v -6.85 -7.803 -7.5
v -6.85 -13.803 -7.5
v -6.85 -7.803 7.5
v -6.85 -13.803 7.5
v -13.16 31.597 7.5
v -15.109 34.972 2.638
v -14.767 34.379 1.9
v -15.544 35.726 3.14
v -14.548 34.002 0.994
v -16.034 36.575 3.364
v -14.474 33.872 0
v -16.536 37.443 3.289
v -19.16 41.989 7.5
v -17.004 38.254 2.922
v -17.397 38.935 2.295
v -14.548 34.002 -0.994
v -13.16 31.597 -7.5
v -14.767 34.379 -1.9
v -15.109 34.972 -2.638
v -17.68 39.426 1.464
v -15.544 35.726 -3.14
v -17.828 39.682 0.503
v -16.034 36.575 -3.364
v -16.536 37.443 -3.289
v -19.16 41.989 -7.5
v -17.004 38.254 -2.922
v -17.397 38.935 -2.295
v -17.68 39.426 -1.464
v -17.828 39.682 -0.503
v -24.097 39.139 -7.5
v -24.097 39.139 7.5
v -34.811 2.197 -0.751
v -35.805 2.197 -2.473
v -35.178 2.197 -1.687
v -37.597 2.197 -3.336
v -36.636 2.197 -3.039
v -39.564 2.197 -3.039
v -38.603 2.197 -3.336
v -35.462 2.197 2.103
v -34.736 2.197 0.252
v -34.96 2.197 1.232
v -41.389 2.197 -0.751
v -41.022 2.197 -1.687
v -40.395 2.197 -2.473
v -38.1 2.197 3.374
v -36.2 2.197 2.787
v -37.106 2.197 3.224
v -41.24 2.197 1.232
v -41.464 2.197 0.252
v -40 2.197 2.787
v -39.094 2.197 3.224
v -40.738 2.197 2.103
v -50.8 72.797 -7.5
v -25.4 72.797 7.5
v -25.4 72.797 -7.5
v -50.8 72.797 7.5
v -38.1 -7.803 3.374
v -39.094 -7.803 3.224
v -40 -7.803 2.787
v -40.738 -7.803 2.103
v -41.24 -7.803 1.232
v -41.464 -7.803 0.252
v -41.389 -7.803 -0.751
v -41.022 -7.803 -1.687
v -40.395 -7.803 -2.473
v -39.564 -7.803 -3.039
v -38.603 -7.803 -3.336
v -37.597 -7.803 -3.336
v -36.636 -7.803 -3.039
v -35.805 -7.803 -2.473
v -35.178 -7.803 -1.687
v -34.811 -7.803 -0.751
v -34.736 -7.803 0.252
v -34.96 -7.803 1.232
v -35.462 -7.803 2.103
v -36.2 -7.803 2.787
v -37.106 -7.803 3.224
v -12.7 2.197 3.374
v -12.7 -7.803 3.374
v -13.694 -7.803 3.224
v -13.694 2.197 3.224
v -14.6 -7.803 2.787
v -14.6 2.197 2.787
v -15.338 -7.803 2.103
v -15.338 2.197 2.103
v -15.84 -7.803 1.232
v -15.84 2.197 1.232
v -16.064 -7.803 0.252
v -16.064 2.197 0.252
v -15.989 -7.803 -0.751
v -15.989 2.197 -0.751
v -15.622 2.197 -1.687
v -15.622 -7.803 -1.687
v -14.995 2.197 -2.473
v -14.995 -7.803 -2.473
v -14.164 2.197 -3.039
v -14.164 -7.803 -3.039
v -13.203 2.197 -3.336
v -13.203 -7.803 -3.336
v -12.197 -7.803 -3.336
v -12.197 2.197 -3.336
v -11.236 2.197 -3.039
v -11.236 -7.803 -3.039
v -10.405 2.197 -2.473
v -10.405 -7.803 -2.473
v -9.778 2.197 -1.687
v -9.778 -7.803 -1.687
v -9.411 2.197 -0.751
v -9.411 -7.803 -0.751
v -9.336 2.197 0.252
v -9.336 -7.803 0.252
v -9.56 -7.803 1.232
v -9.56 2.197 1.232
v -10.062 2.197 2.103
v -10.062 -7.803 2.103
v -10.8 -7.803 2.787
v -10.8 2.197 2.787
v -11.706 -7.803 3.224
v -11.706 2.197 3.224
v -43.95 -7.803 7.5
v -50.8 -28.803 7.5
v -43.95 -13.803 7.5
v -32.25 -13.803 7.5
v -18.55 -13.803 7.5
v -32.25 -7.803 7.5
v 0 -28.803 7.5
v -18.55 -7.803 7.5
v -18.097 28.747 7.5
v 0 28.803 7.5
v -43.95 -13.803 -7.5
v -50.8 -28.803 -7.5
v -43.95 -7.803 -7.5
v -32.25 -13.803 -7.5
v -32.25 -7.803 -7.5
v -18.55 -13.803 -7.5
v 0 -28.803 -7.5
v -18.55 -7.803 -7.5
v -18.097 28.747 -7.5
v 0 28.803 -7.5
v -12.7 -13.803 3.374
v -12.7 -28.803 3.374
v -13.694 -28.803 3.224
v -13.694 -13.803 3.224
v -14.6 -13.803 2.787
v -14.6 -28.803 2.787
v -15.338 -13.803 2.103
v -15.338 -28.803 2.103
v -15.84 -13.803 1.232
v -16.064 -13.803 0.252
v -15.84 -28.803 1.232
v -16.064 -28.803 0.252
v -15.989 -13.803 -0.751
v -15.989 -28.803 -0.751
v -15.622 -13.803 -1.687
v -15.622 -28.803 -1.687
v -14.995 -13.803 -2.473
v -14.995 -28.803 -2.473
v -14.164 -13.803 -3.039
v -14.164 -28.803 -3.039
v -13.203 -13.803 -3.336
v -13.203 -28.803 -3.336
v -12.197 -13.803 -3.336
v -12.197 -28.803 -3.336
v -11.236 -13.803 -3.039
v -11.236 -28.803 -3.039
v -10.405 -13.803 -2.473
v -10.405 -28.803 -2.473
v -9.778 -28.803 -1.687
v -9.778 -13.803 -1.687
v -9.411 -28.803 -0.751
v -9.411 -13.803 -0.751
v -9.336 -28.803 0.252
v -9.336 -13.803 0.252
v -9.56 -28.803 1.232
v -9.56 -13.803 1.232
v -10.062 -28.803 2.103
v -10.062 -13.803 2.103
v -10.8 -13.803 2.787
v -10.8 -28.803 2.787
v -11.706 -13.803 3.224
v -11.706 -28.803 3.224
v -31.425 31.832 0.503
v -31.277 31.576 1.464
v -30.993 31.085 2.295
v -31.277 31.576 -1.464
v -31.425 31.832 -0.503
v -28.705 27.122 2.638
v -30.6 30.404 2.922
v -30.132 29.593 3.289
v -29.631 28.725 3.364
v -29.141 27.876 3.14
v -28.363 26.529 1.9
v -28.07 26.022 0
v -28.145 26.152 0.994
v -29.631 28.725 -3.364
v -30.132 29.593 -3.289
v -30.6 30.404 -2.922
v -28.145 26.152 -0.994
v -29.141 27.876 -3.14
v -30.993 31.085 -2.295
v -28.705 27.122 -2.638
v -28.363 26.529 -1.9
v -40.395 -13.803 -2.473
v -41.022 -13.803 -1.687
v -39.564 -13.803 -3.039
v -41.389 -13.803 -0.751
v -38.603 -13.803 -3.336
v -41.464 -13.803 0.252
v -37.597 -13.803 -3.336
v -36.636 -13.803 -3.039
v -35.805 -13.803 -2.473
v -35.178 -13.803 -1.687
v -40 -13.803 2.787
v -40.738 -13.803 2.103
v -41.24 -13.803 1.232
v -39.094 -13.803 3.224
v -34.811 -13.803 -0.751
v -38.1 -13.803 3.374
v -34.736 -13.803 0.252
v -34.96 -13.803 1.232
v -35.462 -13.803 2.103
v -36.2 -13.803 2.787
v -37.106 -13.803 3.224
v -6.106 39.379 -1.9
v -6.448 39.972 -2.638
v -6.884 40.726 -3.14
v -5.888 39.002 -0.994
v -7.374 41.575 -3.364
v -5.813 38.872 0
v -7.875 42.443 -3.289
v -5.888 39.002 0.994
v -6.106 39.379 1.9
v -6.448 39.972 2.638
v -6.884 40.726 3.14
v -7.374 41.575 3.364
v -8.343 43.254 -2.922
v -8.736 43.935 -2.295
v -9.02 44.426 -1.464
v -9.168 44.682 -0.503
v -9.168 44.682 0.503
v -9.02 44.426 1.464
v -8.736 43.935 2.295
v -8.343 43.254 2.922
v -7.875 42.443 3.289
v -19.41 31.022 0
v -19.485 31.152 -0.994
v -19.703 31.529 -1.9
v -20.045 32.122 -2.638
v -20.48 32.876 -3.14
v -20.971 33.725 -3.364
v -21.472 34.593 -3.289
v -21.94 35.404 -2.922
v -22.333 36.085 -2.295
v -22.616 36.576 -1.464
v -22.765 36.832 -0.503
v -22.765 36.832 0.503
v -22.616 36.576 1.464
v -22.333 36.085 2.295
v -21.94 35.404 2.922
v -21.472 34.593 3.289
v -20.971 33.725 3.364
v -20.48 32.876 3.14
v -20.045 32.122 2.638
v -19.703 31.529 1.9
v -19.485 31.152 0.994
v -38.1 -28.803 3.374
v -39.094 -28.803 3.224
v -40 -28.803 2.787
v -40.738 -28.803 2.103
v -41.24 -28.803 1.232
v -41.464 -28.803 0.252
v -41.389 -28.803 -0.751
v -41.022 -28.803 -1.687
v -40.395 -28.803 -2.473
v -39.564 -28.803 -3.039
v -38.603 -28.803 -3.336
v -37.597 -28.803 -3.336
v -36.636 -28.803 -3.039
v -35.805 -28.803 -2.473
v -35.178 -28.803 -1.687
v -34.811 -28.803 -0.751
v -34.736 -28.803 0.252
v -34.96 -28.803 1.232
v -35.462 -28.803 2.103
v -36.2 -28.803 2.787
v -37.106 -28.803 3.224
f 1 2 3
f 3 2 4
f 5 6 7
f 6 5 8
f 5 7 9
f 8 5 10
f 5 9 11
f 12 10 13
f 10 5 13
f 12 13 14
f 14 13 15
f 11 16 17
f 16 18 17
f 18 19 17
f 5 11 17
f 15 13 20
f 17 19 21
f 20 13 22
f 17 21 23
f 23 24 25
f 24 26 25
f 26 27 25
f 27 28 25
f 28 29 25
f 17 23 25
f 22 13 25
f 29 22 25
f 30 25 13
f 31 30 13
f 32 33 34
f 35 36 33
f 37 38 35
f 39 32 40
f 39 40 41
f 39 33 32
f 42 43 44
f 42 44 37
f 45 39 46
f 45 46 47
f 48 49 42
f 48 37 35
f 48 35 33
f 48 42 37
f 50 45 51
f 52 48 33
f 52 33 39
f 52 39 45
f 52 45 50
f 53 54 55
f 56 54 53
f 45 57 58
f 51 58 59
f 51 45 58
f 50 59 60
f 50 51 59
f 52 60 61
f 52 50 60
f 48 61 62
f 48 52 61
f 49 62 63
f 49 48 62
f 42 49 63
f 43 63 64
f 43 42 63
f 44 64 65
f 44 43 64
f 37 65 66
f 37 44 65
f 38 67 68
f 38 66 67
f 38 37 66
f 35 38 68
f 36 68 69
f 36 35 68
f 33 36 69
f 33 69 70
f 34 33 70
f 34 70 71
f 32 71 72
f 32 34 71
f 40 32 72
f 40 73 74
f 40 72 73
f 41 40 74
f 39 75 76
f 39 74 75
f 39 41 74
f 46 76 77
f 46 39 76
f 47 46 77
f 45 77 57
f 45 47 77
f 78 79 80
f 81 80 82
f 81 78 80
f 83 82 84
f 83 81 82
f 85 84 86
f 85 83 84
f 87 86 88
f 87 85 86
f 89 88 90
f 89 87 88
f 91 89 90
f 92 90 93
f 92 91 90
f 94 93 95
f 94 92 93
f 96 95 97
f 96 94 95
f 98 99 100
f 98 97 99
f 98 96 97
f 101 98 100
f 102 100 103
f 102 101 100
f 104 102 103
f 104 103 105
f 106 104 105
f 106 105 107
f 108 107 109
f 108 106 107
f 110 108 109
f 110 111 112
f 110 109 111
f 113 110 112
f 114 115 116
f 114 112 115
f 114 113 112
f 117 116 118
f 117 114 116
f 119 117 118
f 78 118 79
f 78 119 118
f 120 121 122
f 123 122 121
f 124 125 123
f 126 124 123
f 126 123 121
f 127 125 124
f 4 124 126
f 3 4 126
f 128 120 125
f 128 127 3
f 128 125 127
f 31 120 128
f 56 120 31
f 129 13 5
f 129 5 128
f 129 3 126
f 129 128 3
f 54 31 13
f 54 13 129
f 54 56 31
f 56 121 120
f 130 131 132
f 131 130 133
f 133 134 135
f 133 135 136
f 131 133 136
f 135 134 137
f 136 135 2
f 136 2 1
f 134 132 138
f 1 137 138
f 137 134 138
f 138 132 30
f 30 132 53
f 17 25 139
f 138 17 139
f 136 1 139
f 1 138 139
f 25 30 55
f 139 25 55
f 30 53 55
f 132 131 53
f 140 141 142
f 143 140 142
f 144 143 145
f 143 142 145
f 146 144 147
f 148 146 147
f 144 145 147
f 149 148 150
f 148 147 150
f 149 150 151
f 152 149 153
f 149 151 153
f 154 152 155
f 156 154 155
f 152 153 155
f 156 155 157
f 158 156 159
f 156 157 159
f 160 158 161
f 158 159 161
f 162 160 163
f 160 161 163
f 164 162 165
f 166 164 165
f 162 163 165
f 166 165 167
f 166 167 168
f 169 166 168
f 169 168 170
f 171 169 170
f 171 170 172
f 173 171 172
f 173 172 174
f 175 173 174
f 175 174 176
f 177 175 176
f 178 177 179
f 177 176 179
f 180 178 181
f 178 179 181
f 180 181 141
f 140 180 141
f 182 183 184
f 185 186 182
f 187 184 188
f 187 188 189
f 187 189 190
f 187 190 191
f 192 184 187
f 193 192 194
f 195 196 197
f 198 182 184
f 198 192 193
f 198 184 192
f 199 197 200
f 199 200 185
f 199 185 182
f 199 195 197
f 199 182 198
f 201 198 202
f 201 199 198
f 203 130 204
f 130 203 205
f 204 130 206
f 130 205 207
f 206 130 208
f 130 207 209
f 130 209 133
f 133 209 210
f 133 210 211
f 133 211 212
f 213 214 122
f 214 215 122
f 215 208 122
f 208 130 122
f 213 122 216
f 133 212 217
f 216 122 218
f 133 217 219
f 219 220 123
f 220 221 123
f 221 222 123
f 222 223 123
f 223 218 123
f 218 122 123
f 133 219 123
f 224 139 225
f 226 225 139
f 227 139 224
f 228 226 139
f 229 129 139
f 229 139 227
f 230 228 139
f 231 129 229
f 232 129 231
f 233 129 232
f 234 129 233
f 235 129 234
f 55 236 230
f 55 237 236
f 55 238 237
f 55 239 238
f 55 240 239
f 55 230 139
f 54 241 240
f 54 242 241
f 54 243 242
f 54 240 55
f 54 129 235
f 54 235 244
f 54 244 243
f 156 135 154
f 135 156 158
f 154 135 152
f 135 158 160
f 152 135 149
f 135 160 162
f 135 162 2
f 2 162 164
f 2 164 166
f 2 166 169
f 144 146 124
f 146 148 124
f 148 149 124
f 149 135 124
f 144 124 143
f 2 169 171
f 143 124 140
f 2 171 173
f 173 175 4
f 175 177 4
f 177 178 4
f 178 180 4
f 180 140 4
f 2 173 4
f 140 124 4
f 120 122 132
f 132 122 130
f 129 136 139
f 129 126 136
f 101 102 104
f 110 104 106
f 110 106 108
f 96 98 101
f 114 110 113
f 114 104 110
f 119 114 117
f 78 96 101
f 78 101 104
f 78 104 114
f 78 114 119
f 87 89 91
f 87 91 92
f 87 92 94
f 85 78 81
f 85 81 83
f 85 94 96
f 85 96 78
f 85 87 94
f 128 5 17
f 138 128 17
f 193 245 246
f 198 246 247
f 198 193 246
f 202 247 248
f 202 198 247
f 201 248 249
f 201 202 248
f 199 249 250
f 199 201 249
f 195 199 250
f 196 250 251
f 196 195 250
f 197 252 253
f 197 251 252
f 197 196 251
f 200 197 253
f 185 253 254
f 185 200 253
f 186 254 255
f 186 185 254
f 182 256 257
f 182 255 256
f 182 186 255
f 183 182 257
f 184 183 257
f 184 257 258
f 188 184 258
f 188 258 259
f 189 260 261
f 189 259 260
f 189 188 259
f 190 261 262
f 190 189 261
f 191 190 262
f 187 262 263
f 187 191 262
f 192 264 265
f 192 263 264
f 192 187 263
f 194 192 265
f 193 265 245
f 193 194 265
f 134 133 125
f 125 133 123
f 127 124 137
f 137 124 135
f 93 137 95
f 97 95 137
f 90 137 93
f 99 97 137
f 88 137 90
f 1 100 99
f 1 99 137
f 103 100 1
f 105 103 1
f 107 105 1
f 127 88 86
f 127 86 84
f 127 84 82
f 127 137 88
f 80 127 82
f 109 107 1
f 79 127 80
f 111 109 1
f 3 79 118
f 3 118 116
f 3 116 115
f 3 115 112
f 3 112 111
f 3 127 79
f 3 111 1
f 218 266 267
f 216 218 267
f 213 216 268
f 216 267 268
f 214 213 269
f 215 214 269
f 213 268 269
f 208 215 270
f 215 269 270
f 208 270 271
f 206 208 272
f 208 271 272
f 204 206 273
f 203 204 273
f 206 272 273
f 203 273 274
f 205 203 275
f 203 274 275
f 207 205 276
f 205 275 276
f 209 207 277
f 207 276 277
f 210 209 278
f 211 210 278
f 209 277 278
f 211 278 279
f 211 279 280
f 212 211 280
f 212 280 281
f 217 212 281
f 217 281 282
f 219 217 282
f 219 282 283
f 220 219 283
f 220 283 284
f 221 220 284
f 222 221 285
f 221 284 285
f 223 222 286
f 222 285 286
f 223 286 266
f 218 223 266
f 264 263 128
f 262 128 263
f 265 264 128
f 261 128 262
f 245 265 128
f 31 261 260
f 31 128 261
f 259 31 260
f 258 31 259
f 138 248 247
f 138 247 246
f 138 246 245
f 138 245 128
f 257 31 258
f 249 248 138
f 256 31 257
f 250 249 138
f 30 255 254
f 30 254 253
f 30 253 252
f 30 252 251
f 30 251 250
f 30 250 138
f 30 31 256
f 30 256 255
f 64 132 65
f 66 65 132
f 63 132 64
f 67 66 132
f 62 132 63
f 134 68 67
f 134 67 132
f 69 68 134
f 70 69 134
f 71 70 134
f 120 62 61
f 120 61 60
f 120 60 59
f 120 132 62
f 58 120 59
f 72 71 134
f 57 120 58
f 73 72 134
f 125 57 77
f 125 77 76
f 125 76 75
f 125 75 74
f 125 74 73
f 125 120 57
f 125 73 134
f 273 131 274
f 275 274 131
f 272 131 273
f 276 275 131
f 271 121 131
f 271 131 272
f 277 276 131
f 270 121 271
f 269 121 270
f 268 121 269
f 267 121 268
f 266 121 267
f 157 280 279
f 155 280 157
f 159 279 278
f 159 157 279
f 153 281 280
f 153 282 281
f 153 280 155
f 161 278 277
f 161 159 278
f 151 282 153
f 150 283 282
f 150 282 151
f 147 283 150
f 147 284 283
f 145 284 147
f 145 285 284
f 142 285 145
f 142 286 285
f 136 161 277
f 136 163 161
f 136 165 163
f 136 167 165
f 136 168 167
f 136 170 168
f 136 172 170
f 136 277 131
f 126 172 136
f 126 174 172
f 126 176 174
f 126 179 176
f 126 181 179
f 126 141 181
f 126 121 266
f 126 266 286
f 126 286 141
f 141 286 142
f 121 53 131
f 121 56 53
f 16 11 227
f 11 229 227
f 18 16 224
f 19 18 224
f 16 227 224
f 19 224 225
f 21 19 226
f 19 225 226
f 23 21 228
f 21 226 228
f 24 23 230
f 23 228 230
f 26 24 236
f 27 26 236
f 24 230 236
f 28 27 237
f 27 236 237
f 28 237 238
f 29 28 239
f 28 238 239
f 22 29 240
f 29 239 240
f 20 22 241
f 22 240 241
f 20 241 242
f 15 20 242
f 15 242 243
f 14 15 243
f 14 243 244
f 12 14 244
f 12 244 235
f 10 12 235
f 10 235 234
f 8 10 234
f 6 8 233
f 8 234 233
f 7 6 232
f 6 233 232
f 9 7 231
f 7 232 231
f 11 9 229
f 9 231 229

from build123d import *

# Parameters (mm, degrees)
BOSS_EXTRUDE1_DEPTH                       = 7.5
CUT_EXTRUDE1_START                        = -10
CUT_EXTRUDE1_DEPTH                        = 5.7
SKETCH5_W                                 = 3.373501
SKETCH5_H                                 = 31.997045256
CUT_EXTRUDE2_START                        = -15
CUT_EXTRUDE2_DEPTH                        = 6
SKETCH8_W                                 = 3.373501
SKETCH8_H                                 = 15
F_17_64_0_26563_DIAMETER_HOLE2_AT_2_COUNT = 2
F_17_64_0_26563_DIAMETER_HOLE2_AT_2_PITCH = 25.4
CUT_EXTRUDE4_START                        = -31
SKETCH10_R                                = 3.373501
CUT_EXTRUDE4_DEPTH                        = 31
CUT_EXTRUDE5_START                        = -25.7
SKETCH11_R                                = 3.373501
CUT_EXTRUDE5_DEPTH                        = 25.7


with BuildPart() as part:
    # Sketch1 → Boss-Extrude1 (new, symmetric)
    with BuildSketch(Plane.XY):
        Polygon((0, -28.802954744), (0, 28.802954744), (-25.4, 72.797045256), (-50.8, 72.797045256), (-50.8, -28.802954744), (-25.4, -28.802954744), align=None)
    extrude(amount=BOSS_EXTRUDE1_DEPTH, both=True)

    # Sketch2 → Cut-Extrude1 (cut)
    with BuildSketch(Plane(origin=(12.472045256, 7.200738686, 0), x_dir=(0, 0, -1), z_dir=(0.8660254037844379, 0.5000000000000013, 0)).offset(CUT_EXTRUDE1_START)):
        Polygon((3.464101615, 33.944090512), (7.5, 33.944090512), (7.5, 45.944090512), (3.464101615, 45.944090512), (-3.464101615, 45.944090512), (-7.5, 45.944090512), (-7.5, 33.944090512), (-3.464101615, 33.944090512), align=None)
    extrude(amount=-CUT_EXTRUDE1_DEPTH, mode=Mode.SUBTRACT)

    # Sketch5 → 17/64 (0.26563) Diameter Hole1 (revolve, cut)
    with BuildSketch(Plane(origin=(-16.160254038, 36.793335801, 0), x_dir=(0.500000000000001, -0.866025403784438, 0), z_dir=(0, 0, 1))):
        with Locations((1.6867505, 15.998522628)):
            Rectangle(SKETCH5_W, SKETCH5_H)
    revolve(axis=Axis((-21.659515352, 33.618335801, 0), (0.866025403784438, 0.500000000000001, 0)), mode=Mode.SUBTRACT)

    # Sketch6 → Cut-Extrude2 (cut)
    with BuildSketch(Plane.XZ.offset(28.802954744).offset(CUT_EXTRUDE2_START)):
        Polygon((-43.95, 3.377499075), (-43.95, -3.377499075), (-43.95, -7.5), (-32.25, -7.5), (-32.25, -3.377499075), (-32.25, 3.377499075), (-32.25, 7.5), (-43.95, 7.5), align=None)
        Polygon((-18.55, 3.377499075), (-18.55, -3.377499075), (-18.55, -7.5), (-6.85, -7.5), (-6.85, -3.377499075), (-6.85, 3.377499075), (-6.85, 7.5), (-18.55, 7.5), align=None)
    extrude(amount=-CUT_EXTRUDE2_DEPTH, mode=Mode.SUBTRACT)

    # Sketch8 → 17/64 (0.26563) Diameter Hole2 (revolve, cut)
    with BuildSketch(Plane(origin=(-38.1, -13.802954744, 0), x_dir=(0, 0, 1), z_dir=(1, 0, 0))):
        with Locations((1.6867505, 7.5)):
            Rectangle(SKETCH8_W, SKETCH8_H)
    f_17_64_0_26563_diameter_hole2 = revolve(axis=Axis((-38.1, -7.452954744, 0), (0, -1, 0)), mode=Mode.SUBTRACT)

    # 17/64 (0.26563) Diameter Hole2 at 2: 17/64 (0.26563) Diameter Hole2 ×2
    with Locations(*[(i * F_17_64_0_26563_DIAMETER_HOLE2_AT_2_PITCH, 0, 0) for i in range(1, F_17_64_0_26563_DIAMETER_HOLE2_AT_2_COUNT)]):
        add(f_17_64_0_26563_diameter_hole2, mode=Mode.SUBTRACT)

    # Sketch10 → Cut-Extrude4 (cut)
    with BuildSketch(Plane.XZ.offset(28.802954744).offset(CUT_EXTRUDE4_START)):
        with Locations(Location((-38.1, 0, 0), (0, 0, 90))):
            Circle(SKETCH10_R)
        with Locations(Location((-12.7, 0, 0), (0, 0, 90))):
            Circle(SKETCH10_R)
    extrude(amount=CUT_EXTRUDE4_DEPTH, mode=Mode.SUBTRACT)

    # Sketch11 → Cut-Extrude5 (cut)
    with BuildSketch(Plane(origin=(12.472045256, 7.200738686, 0), x_dir=(0, 0, -1), z_dir=(0.8660254037844378, 0.5000000000000017, 0)).offset(CUT_EXTRUDE5_START)):
        with Locations(Location((0, 39.944090512, 0), (0, 0, 270))):
            Circle(SKETCH11_R)
    extrude(amount=CUT_EXTRUDE5_DEPTH, mode=Mode.SUBTRACT)


solid = part.part
